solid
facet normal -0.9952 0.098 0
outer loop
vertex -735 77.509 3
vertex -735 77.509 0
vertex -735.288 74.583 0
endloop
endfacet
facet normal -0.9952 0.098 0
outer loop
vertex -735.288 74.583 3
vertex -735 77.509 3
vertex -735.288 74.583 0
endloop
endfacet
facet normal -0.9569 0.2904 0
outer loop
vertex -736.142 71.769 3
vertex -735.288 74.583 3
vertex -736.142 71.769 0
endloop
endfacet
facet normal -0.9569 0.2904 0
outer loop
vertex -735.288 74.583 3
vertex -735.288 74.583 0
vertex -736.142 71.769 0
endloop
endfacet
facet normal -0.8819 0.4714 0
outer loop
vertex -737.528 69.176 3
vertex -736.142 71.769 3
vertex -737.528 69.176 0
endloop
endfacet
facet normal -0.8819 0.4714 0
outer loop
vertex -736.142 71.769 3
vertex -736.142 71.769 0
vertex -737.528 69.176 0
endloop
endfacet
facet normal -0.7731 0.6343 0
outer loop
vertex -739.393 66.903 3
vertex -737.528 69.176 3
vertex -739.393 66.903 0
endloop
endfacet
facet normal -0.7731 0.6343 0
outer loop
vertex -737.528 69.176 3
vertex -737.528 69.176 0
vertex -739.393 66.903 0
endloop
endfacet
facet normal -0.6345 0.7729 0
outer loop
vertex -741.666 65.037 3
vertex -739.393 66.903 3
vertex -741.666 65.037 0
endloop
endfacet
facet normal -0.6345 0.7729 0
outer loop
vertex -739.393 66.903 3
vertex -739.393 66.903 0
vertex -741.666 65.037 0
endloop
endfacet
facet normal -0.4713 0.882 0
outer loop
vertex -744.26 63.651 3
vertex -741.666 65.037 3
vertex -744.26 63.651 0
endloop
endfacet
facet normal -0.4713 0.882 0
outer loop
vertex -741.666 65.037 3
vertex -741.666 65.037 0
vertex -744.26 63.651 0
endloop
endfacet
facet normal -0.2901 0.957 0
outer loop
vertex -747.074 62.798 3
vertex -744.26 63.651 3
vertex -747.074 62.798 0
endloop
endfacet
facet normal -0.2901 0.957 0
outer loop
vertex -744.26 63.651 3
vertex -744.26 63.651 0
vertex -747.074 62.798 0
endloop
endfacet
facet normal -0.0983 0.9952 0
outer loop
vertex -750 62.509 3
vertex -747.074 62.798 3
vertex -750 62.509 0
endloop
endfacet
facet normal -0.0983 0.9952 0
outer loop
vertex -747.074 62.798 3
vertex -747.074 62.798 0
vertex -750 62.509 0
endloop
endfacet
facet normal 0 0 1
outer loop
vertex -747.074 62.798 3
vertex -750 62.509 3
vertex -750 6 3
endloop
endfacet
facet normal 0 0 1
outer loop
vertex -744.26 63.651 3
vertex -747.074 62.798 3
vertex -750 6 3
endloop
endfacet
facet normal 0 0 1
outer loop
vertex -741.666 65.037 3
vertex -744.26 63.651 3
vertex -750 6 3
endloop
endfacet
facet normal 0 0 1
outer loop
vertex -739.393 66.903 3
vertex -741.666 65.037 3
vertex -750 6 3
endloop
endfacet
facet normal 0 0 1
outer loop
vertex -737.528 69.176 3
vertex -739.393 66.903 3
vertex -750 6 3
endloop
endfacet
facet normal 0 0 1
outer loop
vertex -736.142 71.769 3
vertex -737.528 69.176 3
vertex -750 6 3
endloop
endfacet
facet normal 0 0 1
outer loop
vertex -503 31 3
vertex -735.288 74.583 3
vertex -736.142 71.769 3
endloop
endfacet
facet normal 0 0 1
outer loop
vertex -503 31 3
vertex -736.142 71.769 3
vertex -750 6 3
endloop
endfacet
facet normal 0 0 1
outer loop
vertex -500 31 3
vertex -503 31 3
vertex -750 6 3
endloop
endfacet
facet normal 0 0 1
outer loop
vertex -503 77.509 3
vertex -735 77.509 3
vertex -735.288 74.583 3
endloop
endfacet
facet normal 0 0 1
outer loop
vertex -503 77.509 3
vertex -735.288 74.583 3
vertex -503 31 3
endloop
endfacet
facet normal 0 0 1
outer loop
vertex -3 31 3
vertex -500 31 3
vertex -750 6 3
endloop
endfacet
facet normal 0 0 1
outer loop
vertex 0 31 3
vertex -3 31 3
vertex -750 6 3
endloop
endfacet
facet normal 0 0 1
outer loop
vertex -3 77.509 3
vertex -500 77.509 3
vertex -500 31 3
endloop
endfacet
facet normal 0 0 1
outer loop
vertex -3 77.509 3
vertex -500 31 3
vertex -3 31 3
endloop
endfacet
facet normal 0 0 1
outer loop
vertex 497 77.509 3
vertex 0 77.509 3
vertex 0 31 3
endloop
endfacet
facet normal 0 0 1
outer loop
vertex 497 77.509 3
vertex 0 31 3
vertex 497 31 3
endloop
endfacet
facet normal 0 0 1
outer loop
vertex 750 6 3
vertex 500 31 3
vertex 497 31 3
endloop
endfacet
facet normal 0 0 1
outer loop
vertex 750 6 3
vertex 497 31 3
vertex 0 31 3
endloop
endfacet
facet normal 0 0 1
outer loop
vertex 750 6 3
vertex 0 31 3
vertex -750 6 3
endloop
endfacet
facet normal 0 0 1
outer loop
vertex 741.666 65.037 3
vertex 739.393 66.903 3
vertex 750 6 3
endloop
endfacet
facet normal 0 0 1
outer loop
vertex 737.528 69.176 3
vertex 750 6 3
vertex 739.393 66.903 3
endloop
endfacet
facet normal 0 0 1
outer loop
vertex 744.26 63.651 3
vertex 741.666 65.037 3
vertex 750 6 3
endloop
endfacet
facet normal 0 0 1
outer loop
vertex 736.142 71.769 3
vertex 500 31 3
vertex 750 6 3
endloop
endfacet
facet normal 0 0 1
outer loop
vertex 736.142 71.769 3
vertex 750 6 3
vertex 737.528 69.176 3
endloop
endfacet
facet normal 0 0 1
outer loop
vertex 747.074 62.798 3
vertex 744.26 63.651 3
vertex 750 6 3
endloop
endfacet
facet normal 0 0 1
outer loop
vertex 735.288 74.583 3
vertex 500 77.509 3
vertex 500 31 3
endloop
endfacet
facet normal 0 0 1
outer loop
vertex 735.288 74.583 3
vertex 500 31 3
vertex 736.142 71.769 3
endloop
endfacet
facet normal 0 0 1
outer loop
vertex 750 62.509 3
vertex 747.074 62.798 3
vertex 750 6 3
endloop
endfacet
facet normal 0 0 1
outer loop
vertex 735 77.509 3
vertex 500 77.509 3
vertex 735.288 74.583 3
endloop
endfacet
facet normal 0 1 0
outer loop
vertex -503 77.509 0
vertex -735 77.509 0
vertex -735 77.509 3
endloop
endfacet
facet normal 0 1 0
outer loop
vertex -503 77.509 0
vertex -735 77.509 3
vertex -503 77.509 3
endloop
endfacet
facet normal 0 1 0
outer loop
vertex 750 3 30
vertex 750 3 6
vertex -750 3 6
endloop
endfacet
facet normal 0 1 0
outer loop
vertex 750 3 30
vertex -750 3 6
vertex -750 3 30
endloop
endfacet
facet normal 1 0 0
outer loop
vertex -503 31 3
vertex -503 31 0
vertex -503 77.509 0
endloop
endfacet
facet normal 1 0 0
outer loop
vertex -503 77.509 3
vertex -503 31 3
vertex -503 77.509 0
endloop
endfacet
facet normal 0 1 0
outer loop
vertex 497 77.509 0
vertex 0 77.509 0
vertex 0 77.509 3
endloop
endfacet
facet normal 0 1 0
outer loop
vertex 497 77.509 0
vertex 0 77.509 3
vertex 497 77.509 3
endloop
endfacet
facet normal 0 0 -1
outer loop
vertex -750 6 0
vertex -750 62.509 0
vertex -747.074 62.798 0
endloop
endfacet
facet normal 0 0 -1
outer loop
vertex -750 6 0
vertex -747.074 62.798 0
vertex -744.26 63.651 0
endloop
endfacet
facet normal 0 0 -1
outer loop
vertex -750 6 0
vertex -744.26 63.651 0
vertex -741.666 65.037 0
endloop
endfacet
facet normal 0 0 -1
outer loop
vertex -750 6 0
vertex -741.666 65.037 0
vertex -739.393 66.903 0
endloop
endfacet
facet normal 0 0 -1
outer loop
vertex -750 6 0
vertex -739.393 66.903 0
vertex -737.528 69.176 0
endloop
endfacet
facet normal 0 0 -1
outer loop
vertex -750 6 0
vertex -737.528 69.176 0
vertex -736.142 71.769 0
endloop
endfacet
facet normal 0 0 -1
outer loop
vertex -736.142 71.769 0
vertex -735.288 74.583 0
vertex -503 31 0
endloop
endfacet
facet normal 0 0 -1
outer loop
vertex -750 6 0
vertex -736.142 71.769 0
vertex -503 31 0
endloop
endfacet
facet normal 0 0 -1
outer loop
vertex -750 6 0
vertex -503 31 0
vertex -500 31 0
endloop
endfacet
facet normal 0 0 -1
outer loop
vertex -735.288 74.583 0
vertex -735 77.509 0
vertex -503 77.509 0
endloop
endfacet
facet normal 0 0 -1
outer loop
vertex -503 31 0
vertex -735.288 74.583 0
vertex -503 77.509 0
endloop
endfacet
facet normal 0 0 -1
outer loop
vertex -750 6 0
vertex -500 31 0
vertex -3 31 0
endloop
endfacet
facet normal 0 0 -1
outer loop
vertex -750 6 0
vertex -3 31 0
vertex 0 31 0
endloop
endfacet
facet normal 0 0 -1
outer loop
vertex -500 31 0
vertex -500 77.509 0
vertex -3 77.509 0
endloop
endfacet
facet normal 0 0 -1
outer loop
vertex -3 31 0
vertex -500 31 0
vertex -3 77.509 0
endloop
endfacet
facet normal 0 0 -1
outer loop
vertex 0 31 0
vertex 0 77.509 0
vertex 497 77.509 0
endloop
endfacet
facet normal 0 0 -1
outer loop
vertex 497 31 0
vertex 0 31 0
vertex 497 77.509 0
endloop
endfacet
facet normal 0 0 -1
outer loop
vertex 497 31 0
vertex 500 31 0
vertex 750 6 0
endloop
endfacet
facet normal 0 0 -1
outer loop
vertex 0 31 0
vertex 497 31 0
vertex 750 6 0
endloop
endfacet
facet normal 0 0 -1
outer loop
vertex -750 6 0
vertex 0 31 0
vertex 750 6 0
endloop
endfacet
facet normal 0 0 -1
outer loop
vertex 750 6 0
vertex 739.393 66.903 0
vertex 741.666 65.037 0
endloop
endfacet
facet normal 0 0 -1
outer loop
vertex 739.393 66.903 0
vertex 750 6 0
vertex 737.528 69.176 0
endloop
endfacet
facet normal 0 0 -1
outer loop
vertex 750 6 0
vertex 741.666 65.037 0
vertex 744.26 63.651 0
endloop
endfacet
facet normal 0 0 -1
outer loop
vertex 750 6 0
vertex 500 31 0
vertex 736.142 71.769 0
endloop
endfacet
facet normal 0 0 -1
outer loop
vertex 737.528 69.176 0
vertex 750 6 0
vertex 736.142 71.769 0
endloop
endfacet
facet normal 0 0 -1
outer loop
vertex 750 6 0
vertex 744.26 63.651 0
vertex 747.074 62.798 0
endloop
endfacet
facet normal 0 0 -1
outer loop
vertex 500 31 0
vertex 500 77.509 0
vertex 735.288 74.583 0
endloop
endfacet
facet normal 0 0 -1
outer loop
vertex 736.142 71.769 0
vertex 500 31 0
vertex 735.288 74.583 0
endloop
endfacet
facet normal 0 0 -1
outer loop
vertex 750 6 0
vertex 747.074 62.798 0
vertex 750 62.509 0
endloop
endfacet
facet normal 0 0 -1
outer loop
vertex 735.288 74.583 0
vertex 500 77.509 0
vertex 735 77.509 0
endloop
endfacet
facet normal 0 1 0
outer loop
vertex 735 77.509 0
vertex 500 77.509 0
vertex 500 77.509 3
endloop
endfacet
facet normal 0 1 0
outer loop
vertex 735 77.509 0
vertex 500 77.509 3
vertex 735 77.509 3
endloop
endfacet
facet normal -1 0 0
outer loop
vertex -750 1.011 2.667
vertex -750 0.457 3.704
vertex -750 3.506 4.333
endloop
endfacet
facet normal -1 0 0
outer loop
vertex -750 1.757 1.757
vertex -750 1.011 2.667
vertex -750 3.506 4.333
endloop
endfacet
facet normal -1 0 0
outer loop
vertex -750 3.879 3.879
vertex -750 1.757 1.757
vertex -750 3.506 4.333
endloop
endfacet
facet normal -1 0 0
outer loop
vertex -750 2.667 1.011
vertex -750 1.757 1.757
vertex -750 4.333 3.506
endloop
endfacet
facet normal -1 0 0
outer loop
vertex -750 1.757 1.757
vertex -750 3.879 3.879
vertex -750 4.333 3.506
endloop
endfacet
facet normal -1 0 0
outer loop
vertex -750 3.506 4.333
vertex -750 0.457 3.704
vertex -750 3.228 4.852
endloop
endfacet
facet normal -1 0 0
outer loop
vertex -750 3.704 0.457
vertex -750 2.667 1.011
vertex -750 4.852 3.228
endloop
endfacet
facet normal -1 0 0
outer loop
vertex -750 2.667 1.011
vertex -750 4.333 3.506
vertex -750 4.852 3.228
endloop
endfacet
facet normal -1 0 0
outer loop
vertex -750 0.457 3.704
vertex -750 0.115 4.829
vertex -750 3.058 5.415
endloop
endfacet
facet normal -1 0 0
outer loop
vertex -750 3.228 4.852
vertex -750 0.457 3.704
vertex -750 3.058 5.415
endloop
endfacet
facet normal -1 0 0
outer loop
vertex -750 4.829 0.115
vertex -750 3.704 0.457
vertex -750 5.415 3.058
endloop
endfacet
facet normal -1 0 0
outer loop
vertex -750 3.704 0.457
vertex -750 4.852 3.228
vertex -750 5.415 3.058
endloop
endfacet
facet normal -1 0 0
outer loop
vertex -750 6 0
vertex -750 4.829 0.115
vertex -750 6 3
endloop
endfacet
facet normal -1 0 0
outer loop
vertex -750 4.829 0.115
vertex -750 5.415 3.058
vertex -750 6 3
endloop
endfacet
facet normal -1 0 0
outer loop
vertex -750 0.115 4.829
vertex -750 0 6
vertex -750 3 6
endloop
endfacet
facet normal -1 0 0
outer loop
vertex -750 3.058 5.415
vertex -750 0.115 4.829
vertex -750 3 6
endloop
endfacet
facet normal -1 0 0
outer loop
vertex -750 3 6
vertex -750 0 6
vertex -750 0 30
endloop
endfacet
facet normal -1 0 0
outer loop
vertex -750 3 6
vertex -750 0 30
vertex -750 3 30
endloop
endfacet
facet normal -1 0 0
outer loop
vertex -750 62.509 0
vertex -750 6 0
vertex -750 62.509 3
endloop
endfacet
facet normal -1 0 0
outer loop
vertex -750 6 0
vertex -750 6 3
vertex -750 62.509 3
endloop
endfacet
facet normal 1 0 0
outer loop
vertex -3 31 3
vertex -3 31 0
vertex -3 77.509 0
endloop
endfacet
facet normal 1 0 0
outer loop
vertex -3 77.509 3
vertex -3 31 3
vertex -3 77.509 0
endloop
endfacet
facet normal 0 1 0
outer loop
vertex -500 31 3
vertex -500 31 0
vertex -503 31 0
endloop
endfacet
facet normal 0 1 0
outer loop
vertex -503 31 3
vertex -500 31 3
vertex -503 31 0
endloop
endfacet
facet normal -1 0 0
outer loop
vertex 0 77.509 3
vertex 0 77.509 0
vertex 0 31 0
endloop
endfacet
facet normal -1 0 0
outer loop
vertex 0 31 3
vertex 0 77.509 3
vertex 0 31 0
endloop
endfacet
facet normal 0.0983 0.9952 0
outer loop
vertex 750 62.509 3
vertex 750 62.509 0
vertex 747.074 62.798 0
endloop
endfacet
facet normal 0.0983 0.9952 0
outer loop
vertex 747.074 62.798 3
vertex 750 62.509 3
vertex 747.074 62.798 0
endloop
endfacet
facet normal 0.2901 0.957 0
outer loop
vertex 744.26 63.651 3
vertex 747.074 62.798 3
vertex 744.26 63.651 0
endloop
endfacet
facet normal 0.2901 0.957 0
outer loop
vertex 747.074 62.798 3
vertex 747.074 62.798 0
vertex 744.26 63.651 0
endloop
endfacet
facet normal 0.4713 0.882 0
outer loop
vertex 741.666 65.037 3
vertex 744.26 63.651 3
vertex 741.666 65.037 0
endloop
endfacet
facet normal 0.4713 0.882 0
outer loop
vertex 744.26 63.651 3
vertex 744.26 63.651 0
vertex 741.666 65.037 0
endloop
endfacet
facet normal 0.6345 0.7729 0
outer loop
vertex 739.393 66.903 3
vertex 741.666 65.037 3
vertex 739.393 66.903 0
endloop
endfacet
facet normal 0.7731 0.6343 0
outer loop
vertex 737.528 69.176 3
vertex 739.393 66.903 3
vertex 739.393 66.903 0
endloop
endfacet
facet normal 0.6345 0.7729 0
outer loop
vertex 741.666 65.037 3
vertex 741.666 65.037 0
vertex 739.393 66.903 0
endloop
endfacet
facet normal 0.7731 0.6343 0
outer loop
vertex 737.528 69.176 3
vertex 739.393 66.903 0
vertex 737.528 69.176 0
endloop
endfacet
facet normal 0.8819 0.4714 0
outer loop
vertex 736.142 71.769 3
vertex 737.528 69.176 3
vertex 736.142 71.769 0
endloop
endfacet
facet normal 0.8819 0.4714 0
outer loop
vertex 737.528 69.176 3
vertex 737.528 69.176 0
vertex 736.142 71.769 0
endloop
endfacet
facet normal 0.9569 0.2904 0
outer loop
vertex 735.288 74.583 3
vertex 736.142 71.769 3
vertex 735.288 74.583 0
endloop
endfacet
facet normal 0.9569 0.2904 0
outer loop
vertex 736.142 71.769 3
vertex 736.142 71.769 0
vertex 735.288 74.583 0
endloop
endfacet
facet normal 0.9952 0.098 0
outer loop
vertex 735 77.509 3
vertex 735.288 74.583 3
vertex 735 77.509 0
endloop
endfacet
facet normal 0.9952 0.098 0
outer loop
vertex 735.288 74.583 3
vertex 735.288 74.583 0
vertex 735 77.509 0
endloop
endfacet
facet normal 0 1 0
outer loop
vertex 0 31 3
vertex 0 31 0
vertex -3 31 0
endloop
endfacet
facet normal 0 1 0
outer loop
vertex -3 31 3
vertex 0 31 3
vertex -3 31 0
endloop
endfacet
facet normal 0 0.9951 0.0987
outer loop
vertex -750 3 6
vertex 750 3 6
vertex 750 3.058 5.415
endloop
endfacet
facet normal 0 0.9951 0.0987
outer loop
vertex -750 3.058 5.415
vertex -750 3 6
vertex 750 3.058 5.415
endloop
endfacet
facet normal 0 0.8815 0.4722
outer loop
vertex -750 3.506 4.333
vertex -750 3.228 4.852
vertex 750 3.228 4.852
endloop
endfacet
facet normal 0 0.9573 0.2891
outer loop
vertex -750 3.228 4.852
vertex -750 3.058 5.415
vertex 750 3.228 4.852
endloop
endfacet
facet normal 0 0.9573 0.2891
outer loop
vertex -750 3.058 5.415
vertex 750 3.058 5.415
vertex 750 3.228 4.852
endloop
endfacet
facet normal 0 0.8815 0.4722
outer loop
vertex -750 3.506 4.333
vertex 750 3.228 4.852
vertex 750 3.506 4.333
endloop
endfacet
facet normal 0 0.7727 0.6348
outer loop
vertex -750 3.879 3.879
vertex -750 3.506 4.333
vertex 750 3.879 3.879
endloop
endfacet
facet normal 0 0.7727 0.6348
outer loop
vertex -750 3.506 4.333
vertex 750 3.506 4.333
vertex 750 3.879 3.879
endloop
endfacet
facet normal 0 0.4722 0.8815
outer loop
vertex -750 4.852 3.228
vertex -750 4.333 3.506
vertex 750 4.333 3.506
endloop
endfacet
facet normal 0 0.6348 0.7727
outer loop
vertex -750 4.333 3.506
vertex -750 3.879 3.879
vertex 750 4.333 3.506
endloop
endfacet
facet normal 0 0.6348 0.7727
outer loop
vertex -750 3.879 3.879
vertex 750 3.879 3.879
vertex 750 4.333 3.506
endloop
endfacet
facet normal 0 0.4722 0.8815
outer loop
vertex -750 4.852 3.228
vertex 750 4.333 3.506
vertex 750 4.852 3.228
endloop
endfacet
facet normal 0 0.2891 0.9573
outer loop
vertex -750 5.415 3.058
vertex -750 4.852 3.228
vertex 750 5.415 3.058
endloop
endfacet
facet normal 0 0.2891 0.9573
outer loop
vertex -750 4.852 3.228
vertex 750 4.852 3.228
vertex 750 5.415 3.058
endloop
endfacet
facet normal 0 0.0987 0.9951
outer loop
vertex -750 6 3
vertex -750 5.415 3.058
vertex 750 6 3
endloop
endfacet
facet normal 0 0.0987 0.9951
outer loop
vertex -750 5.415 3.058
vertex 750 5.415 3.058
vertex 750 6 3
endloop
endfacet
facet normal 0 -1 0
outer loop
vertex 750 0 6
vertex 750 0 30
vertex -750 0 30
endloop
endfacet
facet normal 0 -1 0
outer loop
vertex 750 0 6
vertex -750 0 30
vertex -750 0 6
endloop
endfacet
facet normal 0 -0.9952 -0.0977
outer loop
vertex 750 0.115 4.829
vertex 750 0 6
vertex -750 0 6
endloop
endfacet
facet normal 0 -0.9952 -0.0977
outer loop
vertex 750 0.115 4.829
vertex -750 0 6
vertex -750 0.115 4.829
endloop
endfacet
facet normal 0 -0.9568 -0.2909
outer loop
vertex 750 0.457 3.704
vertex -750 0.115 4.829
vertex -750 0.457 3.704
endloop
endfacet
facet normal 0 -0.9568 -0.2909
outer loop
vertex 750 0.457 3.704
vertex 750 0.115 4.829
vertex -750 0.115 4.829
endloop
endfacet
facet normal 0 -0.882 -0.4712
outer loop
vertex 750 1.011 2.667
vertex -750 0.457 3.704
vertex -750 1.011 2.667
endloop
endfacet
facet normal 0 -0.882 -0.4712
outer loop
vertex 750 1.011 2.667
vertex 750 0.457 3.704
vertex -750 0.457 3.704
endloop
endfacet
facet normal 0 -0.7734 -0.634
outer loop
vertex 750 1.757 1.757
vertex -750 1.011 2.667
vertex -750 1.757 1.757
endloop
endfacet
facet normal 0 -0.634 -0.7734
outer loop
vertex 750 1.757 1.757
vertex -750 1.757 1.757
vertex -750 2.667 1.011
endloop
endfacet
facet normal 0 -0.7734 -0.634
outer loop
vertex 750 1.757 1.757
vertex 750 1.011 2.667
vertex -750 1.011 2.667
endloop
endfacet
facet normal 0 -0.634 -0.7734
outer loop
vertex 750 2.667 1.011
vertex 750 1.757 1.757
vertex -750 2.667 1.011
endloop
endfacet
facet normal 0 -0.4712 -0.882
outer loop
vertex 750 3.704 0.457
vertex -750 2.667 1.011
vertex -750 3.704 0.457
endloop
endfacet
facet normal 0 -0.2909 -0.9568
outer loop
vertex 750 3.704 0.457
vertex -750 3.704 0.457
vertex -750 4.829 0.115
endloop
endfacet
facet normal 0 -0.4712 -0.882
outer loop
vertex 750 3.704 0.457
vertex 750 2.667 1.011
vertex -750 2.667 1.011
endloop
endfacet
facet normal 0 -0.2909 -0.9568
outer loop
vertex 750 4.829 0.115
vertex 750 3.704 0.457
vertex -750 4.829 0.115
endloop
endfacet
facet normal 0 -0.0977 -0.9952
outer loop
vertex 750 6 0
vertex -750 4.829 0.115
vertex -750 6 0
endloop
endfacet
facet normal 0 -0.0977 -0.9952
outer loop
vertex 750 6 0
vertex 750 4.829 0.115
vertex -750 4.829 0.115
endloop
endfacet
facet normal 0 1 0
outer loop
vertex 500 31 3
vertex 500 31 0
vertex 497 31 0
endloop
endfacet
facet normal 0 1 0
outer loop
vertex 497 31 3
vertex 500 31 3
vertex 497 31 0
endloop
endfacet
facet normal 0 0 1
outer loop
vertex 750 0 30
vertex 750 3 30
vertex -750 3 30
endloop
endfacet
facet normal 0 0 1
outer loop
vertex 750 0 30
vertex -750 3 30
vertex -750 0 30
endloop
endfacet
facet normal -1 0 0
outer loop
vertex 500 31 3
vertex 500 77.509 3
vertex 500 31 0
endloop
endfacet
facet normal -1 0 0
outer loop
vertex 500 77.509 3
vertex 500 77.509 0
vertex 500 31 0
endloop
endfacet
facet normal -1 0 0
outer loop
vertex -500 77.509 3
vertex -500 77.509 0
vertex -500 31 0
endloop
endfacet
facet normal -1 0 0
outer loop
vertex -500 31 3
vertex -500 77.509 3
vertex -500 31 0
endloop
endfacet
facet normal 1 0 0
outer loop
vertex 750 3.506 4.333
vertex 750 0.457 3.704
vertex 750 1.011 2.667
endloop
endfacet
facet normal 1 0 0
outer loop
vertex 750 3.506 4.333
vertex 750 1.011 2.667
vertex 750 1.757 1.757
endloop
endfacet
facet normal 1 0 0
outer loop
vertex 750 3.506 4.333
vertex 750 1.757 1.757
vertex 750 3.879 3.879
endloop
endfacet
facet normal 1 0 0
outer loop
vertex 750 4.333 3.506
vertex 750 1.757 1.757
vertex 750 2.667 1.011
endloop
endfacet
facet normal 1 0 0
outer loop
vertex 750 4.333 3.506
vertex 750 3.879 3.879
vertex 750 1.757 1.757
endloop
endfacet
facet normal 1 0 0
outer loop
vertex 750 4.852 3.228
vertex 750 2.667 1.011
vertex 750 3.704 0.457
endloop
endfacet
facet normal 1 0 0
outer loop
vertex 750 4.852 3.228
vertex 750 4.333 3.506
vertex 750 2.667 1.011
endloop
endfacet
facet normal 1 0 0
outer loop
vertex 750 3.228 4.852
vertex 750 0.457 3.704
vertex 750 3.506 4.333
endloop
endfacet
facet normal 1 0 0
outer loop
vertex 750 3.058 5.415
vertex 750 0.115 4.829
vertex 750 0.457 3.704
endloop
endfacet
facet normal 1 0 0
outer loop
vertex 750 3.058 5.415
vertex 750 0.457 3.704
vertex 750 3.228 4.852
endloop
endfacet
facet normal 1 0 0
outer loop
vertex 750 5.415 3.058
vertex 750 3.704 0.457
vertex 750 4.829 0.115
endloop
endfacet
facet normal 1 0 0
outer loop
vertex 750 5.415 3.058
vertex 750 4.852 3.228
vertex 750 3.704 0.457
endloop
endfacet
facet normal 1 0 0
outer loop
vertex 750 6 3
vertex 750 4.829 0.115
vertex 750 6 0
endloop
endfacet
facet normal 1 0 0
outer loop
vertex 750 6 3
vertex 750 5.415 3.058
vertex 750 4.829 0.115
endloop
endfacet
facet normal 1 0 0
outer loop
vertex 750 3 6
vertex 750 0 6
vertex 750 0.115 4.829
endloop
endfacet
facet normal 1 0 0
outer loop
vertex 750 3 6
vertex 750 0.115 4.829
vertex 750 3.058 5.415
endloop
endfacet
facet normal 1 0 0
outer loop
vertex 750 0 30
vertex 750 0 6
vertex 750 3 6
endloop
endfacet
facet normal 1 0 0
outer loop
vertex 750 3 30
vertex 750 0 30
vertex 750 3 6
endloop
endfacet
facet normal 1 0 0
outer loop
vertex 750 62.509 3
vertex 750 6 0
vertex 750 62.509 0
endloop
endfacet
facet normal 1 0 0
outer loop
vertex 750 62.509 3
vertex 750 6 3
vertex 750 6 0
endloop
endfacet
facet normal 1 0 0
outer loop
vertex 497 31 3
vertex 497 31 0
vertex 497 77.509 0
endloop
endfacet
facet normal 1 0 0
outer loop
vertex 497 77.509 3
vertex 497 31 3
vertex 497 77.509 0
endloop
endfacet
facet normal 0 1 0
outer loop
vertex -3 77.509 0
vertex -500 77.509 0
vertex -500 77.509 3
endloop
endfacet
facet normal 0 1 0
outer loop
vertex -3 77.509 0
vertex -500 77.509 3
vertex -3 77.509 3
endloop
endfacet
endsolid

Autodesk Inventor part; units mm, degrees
ref_plane "YZ Plane" through (0, 0, 0) normal (1, 0, 0) x (0, 1, 0)
ref_plane "XZ Plane" through (0, 0, 0) normal (0, 1, 0) x (-1, 0, 0)
ref_plane "XY Plane" through (0, 0, 0) normal (0, 0, 1) x (1, 0, 0)
sketch "Sketch1" plane through (0, 0, 0) normal (0, 0, 1) x (1, 0, 0)
  line L0 (-750, 77.5094) -> (750, 77.5094)
  line L1 (750, 77.5094) -> (750, 0)
  line L2 (750, 0) -> (-750, 0)
  line L3 (-750, 0) -> (-750, 77.5094)
  point P0 (0, 0)
  point P1 (0, 0)
  dimension "d0" = 1500
  dimension "d1" = 77.5094
extrude "Plate1" add sketch "Sketch1" along normal blind 3
sketch "Sketch2" plane through (750, 3, 0) normal (0, -1, 0) x (1, 0, 0)
  line L0 (-1500, 0) -> (0, 0)
  line L1 (0, 0) -> (0, 30)
  line L2 (0, 30) -> (-1500, 30)
  line L3 (-1500, 30) -> (-1500, 0)
edge flange "Flange1" height 30 angle 90 thickness 3 bend radius 3 thickness toward (0, -1, 0) relief tear relief width 3 relief depth 1.5 edges at (0, 0, 3) wall of the first edge with corners at (-750, 3, 0) (750, 3, 0) (750, 3, 30) (-750, 3, 30)
bend "Bend1"
corner "Corner1"
sketch "Sketch5" plane through (0, 0, 0) normal (0, 0, -1) x (-1, 0, 0)
  line L0 (750, 77.5094) -> (-750, 77.5094) projected
  line L1 (500, 77.5094) -> (500, 31)
  line L2 (500, 31) -> (503, 31)
  line L3 (503, 31) -> (503, 77.5094)
  line L4 (750, 0) -> (-750, 0) projected
  point P0 (0, 0)
  dimension "d18" = 3
  dimension "d19" = 247
  dimension "d20" = 31
extrude "Extrusion1" cut sketch "Sketch5" against normal through all
pattern_linear "Rectangular Pattern1" count 3 spacing 500 along (1, 0, 0) of "Extrusion1"
sketch "Sketch6" plane through (0, 0, 0) normal (0, 0, -1) x (-1, 0, 0)
  line L0 (-750, 77.5094) -> (-750, 6) projected
  circle A0 centre (-750, 77.5094) radius 15
  line L1 (-750, 77.5094) -> (-500, 77.5094) projected
  point P0 (0, 0)
  point P1 (-735, 77.5094)
  point P2 (-750, 62.5094)
  dimension "d24" = 30
extrude "Extrusion2" cut sketch "Sketch6" against normal through all contours L1 A0 L0 picked at (-740.1254, 76.3968)
mirror "Mirror1" about plane through (0, 0, 0) normal (1, 0, 0) of "Extrusion2"
equation "\"d1\" = Стрингер_6"
equation "\"d18\" = Thickness"
equation "\"d2\" = Thickness"
equation "\"d3\" = BendReliefWidth"
equation "\"d4\" = BendReliefDepth"
equation "\"d5\" = MinimumRemnant"
equation "\"d6\" = TransitionRadius"
equation "\"d9\" = BendRadius"
equation "\"d10\" = CornerReliefSize"
equation "\"d11\" = GapSize"
equation "\"d12\" = JacobiRadiusSize"
equation "\"BendRadius\" = Thickness"
equation "\"BendReliefWidth\" = Thickness"
equation "\"BendReliefDepth\" = 0.5 * Thickness"
equation "\"CornerReliefSize\" = 4 * Thickness"
equation "\"MinimumRemnant\" = 2 * Thickness"
equation "\"TransitionRadius\" = BendRadius"
equation "\"JacobiRadiusSize\" = BendRadius"
equation "\"GapSize\" = Thickness"
equation "\"Стрингер_6\" = 77.509374"
equation "\"Thickness\" = 3"
properties part number "МОО 056 стрингер борт 61"
